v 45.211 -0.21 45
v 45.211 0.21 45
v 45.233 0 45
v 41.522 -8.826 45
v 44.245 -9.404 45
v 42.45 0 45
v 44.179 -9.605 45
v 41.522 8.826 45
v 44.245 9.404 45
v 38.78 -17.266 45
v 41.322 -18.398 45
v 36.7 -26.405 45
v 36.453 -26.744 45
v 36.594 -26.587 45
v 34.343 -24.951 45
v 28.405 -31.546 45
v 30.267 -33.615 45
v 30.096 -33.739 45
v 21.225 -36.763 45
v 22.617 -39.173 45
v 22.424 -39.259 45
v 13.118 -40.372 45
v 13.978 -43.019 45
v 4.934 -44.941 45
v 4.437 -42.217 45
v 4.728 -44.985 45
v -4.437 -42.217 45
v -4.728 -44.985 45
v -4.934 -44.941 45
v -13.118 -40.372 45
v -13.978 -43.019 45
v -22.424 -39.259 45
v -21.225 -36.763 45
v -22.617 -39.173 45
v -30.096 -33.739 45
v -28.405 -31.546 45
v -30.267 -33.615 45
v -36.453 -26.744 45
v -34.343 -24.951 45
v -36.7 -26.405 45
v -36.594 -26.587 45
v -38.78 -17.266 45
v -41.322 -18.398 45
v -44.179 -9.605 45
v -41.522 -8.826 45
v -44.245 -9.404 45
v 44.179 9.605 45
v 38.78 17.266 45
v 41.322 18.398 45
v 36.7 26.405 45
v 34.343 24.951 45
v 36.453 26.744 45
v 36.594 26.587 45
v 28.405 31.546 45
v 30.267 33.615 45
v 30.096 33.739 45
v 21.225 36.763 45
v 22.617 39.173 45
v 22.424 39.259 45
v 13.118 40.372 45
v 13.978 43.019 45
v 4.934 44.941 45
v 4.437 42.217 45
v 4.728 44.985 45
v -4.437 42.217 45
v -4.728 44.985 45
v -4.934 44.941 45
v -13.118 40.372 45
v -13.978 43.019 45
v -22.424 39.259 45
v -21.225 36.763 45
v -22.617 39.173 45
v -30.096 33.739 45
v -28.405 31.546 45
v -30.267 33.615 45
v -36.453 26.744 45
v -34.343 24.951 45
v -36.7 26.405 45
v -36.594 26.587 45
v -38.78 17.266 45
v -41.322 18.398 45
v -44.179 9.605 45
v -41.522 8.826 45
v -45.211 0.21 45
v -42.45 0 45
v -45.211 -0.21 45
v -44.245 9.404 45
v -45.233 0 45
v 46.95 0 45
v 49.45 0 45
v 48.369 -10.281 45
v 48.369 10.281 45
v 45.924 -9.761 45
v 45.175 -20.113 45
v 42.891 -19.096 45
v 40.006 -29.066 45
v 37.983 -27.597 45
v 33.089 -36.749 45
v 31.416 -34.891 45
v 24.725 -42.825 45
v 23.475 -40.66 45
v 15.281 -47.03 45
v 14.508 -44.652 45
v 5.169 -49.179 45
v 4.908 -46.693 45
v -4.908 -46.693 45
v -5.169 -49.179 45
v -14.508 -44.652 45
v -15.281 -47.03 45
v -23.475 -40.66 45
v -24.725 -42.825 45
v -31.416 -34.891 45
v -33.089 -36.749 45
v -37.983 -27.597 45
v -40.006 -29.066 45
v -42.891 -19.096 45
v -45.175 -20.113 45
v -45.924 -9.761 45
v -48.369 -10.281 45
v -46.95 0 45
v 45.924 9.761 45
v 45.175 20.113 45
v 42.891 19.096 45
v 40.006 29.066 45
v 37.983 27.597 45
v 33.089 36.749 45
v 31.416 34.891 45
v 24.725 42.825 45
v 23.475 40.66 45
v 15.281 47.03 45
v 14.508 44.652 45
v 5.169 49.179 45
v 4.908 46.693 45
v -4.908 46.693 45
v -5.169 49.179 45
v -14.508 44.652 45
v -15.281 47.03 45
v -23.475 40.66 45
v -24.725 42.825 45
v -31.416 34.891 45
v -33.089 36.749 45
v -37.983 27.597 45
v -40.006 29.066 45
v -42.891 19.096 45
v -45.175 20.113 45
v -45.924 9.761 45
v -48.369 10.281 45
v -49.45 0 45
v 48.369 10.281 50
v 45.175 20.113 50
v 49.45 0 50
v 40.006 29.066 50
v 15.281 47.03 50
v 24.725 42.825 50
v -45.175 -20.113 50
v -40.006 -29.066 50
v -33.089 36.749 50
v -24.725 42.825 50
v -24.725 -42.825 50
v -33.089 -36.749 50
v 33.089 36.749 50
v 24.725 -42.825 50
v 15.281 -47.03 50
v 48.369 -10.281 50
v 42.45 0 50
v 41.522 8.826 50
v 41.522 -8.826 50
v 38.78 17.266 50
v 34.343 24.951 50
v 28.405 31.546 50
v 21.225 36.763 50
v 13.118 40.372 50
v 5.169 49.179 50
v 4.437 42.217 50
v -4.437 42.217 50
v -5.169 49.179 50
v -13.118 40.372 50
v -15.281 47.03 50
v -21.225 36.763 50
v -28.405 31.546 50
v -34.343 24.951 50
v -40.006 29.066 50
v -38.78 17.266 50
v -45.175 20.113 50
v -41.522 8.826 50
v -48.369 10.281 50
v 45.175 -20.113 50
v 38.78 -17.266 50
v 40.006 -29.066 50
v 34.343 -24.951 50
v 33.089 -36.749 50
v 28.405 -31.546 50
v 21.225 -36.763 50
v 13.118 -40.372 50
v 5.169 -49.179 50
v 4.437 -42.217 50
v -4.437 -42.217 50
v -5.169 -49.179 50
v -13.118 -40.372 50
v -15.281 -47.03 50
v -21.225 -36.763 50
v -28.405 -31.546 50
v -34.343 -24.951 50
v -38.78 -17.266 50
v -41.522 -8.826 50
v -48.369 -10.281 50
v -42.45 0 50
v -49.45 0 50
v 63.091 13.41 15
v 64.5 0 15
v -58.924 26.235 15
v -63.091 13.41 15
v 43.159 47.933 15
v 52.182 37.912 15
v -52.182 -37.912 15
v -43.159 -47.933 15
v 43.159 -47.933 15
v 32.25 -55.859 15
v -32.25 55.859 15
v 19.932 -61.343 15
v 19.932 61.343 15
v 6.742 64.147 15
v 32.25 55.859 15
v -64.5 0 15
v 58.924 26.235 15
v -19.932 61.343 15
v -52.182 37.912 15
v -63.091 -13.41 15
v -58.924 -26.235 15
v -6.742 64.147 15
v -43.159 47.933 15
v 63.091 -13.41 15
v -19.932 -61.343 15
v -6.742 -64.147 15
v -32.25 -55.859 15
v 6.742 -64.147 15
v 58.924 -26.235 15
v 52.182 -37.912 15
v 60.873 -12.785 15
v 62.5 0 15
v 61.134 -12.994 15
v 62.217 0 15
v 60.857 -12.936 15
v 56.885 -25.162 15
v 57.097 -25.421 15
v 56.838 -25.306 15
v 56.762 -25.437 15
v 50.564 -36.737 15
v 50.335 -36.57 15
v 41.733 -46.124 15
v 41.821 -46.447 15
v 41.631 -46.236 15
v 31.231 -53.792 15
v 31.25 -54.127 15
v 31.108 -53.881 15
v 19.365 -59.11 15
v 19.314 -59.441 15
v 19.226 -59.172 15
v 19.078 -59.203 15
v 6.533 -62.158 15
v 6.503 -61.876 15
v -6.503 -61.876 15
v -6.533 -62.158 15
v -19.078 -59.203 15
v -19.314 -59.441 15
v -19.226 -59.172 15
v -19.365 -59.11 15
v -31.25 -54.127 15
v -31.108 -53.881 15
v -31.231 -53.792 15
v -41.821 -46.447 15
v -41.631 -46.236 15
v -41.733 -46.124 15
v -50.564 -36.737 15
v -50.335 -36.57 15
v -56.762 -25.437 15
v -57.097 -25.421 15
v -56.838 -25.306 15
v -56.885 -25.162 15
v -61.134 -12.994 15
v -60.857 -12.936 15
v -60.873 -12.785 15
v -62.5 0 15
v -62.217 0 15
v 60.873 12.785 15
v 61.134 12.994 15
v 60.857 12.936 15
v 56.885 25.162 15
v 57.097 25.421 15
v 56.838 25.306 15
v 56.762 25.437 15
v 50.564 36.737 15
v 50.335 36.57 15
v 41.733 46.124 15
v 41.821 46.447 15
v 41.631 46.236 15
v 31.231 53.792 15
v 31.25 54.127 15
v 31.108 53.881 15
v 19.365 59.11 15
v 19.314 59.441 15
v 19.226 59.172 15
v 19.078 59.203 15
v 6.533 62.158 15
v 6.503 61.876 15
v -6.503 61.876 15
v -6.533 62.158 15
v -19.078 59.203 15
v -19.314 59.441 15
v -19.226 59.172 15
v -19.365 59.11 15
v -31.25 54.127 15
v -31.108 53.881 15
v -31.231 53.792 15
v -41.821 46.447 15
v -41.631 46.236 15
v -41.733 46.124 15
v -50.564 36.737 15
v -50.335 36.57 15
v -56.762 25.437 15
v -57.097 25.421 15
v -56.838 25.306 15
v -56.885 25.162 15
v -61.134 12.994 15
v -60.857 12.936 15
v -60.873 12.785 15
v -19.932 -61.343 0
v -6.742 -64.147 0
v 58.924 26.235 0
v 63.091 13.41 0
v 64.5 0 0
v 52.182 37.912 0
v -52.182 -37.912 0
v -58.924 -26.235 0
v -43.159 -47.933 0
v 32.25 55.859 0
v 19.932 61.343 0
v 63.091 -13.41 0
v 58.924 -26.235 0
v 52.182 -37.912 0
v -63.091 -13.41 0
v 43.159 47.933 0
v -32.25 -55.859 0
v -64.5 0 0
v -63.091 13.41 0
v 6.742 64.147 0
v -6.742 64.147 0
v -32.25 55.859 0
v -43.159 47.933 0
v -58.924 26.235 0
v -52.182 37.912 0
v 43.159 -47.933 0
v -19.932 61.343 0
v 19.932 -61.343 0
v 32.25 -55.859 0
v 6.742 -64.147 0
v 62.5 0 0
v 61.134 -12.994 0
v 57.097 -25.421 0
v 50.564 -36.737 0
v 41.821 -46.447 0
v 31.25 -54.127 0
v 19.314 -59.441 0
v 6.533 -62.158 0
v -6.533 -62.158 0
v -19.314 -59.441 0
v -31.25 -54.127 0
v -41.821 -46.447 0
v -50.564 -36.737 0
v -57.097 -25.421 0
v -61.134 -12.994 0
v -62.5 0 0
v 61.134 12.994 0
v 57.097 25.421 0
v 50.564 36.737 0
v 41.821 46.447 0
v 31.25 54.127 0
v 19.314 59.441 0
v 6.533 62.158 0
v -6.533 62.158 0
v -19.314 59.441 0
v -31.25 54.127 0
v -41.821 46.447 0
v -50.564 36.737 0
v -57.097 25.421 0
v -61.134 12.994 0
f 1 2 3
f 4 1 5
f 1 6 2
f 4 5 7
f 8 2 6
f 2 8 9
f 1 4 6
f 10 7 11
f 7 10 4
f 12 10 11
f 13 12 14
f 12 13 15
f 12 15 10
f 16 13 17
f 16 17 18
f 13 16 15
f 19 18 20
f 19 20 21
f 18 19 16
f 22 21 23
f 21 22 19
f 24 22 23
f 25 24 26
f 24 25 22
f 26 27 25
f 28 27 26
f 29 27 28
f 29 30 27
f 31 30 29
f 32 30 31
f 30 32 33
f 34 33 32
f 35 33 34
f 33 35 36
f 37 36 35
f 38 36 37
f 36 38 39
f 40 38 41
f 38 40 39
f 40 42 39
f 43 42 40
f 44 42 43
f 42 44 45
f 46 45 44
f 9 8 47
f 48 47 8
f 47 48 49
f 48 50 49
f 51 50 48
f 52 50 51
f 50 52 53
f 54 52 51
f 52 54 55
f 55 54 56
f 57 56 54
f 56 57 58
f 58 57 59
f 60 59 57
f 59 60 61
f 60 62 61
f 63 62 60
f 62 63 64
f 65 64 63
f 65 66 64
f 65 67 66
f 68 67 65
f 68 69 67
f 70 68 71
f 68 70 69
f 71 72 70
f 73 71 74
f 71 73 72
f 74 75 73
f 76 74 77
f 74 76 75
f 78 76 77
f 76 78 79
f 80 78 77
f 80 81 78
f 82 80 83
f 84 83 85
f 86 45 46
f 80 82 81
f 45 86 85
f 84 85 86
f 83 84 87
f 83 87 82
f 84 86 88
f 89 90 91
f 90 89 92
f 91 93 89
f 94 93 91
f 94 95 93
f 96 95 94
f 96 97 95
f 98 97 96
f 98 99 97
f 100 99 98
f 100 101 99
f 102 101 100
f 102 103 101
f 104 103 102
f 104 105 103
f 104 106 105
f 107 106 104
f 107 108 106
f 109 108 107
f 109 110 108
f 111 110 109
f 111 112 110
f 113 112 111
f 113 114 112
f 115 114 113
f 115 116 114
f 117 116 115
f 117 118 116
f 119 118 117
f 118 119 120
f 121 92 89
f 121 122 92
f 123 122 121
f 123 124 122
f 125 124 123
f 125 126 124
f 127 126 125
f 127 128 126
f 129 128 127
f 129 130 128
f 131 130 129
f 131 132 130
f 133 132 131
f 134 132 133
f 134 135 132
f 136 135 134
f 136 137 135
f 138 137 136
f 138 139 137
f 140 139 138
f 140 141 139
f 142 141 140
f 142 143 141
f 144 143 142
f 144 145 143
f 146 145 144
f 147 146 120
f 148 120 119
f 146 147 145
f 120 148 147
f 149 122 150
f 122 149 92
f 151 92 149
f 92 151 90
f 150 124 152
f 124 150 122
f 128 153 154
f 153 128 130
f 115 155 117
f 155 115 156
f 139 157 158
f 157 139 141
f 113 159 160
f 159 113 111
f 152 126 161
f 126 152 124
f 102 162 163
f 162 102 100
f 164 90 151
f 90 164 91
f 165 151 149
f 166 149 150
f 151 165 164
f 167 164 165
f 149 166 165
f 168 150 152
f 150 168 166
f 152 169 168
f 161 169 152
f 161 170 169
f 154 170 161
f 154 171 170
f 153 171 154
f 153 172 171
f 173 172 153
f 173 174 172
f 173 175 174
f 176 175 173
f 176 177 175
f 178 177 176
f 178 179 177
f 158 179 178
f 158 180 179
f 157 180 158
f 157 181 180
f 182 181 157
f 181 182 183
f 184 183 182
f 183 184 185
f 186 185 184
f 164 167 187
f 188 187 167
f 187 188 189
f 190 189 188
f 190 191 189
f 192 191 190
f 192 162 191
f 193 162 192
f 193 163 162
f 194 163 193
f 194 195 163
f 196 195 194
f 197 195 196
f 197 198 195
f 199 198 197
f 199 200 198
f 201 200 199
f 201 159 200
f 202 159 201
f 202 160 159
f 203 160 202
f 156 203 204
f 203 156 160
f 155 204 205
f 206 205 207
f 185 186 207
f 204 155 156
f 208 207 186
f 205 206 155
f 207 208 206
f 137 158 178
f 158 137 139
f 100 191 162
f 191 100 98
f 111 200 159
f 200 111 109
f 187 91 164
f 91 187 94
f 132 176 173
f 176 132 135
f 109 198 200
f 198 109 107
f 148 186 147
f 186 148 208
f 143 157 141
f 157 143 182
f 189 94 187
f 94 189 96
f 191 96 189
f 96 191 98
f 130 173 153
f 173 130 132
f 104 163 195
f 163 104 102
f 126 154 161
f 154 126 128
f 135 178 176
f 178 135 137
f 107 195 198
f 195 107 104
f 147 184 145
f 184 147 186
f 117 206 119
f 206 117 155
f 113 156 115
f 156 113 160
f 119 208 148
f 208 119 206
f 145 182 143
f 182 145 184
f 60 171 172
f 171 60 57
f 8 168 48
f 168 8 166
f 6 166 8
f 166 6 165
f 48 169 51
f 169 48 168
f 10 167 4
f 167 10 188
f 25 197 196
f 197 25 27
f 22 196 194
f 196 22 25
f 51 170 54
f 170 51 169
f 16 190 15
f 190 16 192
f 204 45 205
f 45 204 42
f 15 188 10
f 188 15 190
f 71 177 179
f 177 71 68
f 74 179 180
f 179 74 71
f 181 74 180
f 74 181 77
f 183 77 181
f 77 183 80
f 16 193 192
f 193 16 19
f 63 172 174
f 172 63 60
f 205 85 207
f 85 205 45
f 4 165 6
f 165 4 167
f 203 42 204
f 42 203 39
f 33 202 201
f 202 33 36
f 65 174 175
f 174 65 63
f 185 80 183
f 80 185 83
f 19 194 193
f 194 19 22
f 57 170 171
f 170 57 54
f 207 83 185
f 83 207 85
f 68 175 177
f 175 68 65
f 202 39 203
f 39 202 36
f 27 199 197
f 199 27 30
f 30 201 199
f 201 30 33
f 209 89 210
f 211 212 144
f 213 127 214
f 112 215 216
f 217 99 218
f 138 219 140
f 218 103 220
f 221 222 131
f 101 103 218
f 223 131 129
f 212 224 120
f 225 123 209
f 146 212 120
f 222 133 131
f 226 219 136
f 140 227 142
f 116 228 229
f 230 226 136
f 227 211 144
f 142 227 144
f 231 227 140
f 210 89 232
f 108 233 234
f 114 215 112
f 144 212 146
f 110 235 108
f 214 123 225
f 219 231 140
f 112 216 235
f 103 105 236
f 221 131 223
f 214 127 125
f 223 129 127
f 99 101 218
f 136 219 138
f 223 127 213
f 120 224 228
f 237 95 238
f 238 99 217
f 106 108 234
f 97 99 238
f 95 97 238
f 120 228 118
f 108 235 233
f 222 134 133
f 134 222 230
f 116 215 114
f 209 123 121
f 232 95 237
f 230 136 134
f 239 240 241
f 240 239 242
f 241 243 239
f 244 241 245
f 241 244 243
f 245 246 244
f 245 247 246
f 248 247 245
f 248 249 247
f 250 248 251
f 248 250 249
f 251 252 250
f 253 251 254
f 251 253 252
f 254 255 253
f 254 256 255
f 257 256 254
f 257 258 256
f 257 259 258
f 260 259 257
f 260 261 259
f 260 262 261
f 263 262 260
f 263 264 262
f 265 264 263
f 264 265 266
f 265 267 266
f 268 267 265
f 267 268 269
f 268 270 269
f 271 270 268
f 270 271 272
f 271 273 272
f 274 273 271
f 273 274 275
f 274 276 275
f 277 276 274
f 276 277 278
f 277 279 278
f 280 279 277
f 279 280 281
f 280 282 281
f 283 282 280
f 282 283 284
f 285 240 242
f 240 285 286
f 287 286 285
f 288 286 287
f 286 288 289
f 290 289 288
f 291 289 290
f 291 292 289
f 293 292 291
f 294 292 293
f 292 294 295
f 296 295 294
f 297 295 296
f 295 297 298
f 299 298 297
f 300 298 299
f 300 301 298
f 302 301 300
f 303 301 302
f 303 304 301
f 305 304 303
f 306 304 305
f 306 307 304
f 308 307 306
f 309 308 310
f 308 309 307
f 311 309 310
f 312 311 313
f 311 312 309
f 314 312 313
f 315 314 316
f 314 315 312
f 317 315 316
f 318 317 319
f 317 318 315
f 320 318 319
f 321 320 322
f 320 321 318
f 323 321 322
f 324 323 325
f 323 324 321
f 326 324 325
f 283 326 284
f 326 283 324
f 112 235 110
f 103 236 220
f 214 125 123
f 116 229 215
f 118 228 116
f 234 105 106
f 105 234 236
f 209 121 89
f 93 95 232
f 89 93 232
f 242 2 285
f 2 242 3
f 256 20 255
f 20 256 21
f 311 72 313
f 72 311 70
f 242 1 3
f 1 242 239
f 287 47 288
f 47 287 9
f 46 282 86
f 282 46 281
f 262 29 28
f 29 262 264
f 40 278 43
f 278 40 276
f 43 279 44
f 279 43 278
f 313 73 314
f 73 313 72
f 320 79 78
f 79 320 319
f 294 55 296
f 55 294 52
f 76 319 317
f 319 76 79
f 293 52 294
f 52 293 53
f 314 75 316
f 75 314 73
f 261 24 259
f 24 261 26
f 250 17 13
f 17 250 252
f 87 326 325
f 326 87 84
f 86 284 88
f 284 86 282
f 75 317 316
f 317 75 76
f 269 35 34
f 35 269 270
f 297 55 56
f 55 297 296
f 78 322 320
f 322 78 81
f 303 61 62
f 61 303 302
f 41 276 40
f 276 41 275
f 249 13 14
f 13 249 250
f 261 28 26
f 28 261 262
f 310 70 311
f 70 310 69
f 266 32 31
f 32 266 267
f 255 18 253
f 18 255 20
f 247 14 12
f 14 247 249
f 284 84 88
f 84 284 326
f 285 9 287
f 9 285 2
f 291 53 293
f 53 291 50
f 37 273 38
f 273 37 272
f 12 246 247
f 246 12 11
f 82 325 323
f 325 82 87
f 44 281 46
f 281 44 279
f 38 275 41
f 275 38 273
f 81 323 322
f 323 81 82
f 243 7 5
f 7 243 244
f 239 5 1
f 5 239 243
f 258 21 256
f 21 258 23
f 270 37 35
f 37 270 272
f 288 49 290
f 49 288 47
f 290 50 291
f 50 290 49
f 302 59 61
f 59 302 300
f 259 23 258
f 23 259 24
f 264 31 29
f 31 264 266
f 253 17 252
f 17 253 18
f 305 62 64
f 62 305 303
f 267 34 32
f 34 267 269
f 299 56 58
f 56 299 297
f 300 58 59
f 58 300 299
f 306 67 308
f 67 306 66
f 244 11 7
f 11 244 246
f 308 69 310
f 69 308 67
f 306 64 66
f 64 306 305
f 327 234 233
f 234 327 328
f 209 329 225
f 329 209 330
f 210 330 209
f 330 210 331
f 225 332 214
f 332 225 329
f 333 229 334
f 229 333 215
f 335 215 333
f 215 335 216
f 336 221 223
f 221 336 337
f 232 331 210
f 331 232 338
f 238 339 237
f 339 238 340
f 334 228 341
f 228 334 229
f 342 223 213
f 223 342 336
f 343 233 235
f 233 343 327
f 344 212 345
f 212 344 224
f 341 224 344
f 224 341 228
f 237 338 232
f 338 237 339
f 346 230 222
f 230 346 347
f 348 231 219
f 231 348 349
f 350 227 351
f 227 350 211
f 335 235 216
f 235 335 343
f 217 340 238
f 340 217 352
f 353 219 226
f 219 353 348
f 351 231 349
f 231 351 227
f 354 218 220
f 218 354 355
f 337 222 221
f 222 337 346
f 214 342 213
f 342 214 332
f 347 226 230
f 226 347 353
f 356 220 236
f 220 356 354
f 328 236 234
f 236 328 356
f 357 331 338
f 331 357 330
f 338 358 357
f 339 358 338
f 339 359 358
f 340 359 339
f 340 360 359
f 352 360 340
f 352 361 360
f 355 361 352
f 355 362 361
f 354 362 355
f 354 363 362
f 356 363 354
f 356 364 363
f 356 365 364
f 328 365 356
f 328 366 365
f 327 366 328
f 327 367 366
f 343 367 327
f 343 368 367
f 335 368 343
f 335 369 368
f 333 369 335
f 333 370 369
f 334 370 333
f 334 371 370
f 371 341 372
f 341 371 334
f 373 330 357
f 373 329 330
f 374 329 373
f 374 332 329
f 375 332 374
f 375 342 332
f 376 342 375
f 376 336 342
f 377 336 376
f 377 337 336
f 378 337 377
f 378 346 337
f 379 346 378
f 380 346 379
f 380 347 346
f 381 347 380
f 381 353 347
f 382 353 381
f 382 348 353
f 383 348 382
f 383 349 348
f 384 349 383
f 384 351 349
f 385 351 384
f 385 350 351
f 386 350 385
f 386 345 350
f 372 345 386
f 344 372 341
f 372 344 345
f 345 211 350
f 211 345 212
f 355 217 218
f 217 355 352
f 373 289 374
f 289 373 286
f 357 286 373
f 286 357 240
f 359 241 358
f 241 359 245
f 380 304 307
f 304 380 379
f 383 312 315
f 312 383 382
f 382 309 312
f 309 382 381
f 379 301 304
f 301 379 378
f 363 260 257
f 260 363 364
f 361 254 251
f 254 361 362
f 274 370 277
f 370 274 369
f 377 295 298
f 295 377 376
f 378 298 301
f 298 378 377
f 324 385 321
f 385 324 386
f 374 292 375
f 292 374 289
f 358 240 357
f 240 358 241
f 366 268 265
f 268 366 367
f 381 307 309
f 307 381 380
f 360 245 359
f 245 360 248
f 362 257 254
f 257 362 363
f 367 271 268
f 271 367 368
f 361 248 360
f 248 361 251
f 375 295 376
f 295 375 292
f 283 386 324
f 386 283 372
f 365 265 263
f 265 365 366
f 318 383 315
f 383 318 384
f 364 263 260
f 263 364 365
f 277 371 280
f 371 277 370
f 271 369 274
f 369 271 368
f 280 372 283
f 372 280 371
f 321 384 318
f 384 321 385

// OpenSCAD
twidth=3.5*25.4;
bwidth=(5*25.4)-2;
height=50;
theight=5;
bheight=15;
mheight=height-theight-bheight;
width=2;
lip=5;

union()
{translate([0,0,bheight+mheight]){
difference()
{
    cylinder(h=theight,r=twidth/2+lip);
    translate([0,0,-.5])
    cylinder(h=theight+1,r=(twidth/2)-width);
}}
translate([0,0,bheight]){
difference()
{
    cylinder(h=mheight,r1=(bwidth/2+width),r2=(twidth/2)+(lip/2));
    translate([0,0,-.5])
    cylinder(h=mheight+1,r1=(bwidth/2),r2=(twidth/2)-width+(lip/2));
}
}
difference()
{
    cylinder(h=bheight,r=bwidth/2+width);
    translate([0,0,-.5])
    cylinder(h=bheight+1,r=(bwidth/2));
}
}

